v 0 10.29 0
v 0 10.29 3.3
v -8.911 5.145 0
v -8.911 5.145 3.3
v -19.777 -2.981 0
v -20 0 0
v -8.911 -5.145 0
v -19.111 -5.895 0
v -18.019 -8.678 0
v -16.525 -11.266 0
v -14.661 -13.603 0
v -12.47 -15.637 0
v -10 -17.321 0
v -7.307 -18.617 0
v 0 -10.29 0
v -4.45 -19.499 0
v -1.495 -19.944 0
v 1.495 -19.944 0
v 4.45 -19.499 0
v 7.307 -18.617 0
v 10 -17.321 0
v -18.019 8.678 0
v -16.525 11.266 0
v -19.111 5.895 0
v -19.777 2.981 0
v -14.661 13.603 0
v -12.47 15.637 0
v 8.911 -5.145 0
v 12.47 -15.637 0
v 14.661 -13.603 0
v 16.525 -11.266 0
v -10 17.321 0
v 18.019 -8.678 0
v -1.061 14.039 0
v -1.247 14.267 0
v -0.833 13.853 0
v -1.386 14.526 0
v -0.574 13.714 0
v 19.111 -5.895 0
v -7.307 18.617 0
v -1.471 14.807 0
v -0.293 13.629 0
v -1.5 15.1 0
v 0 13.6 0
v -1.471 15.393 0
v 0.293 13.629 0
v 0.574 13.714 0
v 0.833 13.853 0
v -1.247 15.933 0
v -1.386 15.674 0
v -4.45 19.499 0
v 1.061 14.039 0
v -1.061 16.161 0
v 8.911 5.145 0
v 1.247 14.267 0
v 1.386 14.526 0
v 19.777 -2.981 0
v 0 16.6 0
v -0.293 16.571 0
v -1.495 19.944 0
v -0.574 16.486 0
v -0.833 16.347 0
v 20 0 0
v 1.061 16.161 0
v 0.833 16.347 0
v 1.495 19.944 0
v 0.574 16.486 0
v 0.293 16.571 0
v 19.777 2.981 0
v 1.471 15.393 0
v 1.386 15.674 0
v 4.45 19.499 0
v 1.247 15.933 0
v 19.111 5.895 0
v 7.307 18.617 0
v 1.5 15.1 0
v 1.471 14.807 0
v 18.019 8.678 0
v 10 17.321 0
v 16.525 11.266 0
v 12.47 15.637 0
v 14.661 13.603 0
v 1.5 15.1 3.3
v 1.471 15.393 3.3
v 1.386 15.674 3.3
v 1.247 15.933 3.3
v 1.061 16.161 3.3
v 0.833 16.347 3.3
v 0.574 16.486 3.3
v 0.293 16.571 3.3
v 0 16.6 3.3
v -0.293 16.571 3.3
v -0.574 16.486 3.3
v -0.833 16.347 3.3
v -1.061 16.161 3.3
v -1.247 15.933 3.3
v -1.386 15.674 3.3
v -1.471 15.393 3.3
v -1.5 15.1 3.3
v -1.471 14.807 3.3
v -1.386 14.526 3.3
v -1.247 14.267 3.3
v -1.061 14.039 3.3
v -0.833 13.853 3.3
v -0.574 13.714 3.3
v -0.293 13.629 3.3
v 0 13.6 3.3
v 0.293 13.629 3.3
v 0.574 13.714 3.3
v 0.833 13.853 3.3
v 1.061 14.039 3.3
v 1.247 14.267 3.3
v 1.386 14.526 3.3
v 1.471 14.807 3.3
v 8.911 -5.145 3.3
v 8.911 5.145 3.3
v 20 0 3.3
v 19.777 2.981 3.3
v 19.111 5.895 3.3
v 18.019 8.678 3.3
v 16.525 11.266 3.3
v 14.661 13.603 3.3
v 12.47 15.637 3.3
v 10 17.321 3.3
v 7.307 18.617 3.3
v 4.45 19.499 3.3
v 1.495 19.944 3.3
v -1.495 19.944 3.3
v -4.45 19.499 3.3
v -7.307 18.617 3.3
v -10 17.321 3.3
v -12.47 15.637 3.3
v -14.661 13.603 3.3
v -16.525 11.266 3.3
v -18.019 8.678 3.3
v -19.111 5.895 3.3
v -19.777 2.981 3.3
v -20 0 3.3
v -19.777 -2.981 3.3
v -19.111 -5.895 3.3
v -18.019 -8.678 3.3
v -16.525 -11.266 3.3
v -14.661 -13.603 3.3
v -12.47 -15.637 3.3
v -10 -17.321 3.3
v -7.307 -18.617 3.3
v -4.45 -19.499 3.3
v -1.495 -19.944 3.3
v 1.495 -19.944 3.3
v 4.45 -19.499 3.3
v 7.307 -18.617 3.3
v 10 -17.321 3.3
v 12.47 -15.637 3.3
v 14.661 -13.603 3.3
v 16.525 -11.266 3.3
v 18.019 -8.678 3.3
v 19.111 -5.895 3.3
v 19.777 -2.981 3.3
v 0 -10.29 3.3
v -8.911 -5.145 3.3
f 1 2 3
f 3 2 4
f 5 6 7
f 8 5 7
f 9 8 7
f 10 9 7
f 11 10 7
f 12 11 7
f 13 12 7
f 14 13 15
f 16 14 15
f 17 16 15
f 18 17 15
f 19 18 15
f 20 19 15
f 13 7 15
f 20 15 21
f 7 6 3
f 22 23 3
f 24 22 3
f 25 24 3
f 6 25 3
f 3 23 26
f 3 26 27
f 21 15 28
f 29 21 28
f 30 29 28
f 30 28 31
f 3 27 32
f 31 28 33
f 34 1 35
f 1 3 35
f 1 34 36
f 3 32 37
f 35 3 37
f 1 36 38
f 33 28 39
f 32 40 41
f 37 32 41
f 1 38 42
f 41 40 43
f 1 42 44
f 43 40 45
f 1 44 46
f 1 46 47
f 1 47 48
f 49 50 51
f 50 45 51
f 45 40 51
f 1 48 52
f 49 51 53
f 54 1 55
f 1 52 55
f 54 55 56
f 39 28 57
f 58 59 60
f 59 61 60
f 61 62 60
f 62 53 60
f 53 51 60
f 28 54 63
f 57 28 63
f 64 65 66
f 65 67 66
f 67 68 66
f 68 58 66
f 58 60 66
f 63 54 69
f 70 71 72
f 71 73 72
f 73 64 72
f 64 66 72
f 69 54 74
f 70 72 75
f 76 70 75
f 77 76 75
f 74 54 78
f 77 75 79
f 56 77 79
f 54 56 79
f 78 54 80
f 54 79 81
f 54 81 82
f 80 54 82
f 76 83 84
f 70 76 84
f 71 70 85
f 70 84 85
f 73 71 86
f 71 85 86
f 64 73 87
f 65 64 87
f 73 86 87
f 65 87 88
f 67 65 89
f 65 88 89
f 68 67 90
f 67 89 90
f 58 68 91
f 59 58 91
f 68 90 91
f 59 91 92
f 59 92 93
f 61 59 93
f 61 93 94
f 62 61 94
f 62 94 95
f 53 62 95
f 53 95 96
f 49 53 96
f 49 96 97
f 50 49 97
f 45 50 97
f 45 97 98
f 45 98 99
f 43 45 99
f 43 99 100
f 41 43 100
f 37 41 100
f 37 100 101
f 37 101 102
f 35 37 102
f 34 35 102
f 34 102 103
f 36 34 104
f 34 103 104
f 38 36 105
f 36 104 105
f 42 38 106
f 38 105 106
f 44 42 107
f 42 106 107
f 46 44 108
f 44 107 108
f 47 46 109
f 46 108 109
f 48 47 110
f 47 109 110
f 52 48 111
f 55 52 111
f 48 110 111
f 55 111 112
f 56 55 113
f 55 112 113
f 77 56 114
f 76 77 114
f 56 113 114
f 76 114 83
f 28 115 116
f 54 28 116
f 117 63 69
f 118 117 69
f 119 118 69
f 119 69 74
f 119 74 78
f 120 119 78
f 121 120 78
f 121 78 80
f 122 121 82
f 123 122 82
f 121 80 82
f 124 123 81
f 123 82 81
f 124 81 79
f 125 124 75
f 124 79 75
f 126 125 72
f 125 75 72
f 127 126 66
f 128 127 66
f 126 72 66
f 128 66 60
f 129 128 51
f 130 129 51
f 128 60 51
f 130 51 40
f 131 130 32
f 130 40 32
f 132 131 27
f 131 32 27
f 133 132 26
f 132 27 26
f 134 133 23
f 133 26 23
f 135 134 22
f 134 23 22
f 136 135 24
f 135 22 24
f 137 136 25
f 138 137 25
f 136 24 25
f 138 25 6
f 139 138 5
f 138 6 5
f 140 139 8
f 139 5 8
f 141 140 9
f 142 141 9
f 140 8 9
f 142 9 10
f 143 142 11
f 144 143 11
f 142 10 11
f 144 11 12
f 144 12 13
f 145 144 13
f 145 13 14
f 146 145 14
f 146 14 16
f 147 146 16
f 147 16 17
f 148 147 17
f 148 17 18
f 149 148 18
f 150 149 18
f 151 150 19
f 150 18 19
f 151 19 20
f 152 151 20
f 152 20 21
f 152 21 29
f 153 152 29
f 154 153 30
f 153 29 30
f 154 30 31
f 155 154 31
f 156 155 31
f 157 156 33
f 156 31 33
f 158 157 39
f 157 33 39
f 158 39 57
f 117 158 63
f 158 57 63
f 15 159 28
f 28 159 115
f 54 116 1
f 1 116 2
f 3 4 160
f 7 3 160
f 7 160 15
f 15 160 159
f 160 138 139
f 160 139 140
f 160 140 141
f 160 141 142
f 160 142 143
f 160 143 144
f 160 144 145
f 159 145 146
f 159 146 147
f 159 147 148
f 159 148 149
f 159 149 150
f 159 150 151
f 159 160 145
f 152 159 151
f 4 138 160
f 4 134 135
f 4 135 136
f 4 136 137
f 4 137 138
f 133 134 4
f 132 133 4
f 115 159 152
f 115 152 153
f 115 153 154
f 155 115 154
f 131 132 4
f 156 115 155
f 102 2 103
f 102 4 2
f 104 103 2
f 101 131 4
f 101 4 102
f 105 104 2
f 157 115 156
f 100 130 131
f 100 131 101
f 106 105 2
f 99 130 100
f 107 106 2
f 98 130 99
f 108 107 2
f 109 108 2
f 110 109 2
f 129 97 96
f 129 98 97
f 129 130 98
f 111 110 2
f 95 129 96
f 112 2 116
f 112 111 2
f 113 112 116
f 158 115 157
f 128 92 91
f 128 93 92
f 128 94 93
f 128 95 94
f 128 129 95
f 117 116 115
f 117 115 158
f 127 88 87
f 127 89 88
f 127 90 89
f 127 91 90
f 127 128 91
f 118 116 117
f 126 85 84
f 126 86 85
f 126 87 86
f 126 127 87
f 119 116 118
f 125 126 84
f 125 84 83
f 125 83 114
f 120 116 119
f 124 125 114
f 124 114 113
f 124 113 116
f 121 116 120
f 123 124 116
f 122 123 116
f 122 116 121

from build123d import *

# Parameters (mm, degrees)
CYLINDER_R      = 20
CYLINDER_DEPTH  = 3.3
SKETCH_R        = 1.5
POCKET_DEPTH    = 3.301
POCKET001_DEPTH = 5


with BuildPart() as part:
    # Cylinder → Cylinder (new body)
    with BuildSketch(Plane.XY):
        Circle(CYLINDER_R)
    extrude(amount=CYLINDER_DEPTH)

    # Sketch (on Face2 of Cylinder) → Pocket (cut, through all)
    with BuildSketch(Plane.XY.offset(3.3)):
        with Locations((0, 15.1)):
            Circle(SKETCH_R)
    extrude(amount=-POCKET_DEPTH, mode=Mode.SUBTRACT)

    # CopySketch001 → Pocket001 (cut)
    with BuildSketch(Plane.XY.offset(3.3)):
        Polygon((8.911401, 5.145), (0, 10.29), (-8.911401, 5.145), (-8.911401, -5.145), (0, -10.29), (8.911401, -5.145), align=None)
    extrude(amount=-POCKET001_DEPTH, mode=Mode.SUBTRACT)


solid = part.part
